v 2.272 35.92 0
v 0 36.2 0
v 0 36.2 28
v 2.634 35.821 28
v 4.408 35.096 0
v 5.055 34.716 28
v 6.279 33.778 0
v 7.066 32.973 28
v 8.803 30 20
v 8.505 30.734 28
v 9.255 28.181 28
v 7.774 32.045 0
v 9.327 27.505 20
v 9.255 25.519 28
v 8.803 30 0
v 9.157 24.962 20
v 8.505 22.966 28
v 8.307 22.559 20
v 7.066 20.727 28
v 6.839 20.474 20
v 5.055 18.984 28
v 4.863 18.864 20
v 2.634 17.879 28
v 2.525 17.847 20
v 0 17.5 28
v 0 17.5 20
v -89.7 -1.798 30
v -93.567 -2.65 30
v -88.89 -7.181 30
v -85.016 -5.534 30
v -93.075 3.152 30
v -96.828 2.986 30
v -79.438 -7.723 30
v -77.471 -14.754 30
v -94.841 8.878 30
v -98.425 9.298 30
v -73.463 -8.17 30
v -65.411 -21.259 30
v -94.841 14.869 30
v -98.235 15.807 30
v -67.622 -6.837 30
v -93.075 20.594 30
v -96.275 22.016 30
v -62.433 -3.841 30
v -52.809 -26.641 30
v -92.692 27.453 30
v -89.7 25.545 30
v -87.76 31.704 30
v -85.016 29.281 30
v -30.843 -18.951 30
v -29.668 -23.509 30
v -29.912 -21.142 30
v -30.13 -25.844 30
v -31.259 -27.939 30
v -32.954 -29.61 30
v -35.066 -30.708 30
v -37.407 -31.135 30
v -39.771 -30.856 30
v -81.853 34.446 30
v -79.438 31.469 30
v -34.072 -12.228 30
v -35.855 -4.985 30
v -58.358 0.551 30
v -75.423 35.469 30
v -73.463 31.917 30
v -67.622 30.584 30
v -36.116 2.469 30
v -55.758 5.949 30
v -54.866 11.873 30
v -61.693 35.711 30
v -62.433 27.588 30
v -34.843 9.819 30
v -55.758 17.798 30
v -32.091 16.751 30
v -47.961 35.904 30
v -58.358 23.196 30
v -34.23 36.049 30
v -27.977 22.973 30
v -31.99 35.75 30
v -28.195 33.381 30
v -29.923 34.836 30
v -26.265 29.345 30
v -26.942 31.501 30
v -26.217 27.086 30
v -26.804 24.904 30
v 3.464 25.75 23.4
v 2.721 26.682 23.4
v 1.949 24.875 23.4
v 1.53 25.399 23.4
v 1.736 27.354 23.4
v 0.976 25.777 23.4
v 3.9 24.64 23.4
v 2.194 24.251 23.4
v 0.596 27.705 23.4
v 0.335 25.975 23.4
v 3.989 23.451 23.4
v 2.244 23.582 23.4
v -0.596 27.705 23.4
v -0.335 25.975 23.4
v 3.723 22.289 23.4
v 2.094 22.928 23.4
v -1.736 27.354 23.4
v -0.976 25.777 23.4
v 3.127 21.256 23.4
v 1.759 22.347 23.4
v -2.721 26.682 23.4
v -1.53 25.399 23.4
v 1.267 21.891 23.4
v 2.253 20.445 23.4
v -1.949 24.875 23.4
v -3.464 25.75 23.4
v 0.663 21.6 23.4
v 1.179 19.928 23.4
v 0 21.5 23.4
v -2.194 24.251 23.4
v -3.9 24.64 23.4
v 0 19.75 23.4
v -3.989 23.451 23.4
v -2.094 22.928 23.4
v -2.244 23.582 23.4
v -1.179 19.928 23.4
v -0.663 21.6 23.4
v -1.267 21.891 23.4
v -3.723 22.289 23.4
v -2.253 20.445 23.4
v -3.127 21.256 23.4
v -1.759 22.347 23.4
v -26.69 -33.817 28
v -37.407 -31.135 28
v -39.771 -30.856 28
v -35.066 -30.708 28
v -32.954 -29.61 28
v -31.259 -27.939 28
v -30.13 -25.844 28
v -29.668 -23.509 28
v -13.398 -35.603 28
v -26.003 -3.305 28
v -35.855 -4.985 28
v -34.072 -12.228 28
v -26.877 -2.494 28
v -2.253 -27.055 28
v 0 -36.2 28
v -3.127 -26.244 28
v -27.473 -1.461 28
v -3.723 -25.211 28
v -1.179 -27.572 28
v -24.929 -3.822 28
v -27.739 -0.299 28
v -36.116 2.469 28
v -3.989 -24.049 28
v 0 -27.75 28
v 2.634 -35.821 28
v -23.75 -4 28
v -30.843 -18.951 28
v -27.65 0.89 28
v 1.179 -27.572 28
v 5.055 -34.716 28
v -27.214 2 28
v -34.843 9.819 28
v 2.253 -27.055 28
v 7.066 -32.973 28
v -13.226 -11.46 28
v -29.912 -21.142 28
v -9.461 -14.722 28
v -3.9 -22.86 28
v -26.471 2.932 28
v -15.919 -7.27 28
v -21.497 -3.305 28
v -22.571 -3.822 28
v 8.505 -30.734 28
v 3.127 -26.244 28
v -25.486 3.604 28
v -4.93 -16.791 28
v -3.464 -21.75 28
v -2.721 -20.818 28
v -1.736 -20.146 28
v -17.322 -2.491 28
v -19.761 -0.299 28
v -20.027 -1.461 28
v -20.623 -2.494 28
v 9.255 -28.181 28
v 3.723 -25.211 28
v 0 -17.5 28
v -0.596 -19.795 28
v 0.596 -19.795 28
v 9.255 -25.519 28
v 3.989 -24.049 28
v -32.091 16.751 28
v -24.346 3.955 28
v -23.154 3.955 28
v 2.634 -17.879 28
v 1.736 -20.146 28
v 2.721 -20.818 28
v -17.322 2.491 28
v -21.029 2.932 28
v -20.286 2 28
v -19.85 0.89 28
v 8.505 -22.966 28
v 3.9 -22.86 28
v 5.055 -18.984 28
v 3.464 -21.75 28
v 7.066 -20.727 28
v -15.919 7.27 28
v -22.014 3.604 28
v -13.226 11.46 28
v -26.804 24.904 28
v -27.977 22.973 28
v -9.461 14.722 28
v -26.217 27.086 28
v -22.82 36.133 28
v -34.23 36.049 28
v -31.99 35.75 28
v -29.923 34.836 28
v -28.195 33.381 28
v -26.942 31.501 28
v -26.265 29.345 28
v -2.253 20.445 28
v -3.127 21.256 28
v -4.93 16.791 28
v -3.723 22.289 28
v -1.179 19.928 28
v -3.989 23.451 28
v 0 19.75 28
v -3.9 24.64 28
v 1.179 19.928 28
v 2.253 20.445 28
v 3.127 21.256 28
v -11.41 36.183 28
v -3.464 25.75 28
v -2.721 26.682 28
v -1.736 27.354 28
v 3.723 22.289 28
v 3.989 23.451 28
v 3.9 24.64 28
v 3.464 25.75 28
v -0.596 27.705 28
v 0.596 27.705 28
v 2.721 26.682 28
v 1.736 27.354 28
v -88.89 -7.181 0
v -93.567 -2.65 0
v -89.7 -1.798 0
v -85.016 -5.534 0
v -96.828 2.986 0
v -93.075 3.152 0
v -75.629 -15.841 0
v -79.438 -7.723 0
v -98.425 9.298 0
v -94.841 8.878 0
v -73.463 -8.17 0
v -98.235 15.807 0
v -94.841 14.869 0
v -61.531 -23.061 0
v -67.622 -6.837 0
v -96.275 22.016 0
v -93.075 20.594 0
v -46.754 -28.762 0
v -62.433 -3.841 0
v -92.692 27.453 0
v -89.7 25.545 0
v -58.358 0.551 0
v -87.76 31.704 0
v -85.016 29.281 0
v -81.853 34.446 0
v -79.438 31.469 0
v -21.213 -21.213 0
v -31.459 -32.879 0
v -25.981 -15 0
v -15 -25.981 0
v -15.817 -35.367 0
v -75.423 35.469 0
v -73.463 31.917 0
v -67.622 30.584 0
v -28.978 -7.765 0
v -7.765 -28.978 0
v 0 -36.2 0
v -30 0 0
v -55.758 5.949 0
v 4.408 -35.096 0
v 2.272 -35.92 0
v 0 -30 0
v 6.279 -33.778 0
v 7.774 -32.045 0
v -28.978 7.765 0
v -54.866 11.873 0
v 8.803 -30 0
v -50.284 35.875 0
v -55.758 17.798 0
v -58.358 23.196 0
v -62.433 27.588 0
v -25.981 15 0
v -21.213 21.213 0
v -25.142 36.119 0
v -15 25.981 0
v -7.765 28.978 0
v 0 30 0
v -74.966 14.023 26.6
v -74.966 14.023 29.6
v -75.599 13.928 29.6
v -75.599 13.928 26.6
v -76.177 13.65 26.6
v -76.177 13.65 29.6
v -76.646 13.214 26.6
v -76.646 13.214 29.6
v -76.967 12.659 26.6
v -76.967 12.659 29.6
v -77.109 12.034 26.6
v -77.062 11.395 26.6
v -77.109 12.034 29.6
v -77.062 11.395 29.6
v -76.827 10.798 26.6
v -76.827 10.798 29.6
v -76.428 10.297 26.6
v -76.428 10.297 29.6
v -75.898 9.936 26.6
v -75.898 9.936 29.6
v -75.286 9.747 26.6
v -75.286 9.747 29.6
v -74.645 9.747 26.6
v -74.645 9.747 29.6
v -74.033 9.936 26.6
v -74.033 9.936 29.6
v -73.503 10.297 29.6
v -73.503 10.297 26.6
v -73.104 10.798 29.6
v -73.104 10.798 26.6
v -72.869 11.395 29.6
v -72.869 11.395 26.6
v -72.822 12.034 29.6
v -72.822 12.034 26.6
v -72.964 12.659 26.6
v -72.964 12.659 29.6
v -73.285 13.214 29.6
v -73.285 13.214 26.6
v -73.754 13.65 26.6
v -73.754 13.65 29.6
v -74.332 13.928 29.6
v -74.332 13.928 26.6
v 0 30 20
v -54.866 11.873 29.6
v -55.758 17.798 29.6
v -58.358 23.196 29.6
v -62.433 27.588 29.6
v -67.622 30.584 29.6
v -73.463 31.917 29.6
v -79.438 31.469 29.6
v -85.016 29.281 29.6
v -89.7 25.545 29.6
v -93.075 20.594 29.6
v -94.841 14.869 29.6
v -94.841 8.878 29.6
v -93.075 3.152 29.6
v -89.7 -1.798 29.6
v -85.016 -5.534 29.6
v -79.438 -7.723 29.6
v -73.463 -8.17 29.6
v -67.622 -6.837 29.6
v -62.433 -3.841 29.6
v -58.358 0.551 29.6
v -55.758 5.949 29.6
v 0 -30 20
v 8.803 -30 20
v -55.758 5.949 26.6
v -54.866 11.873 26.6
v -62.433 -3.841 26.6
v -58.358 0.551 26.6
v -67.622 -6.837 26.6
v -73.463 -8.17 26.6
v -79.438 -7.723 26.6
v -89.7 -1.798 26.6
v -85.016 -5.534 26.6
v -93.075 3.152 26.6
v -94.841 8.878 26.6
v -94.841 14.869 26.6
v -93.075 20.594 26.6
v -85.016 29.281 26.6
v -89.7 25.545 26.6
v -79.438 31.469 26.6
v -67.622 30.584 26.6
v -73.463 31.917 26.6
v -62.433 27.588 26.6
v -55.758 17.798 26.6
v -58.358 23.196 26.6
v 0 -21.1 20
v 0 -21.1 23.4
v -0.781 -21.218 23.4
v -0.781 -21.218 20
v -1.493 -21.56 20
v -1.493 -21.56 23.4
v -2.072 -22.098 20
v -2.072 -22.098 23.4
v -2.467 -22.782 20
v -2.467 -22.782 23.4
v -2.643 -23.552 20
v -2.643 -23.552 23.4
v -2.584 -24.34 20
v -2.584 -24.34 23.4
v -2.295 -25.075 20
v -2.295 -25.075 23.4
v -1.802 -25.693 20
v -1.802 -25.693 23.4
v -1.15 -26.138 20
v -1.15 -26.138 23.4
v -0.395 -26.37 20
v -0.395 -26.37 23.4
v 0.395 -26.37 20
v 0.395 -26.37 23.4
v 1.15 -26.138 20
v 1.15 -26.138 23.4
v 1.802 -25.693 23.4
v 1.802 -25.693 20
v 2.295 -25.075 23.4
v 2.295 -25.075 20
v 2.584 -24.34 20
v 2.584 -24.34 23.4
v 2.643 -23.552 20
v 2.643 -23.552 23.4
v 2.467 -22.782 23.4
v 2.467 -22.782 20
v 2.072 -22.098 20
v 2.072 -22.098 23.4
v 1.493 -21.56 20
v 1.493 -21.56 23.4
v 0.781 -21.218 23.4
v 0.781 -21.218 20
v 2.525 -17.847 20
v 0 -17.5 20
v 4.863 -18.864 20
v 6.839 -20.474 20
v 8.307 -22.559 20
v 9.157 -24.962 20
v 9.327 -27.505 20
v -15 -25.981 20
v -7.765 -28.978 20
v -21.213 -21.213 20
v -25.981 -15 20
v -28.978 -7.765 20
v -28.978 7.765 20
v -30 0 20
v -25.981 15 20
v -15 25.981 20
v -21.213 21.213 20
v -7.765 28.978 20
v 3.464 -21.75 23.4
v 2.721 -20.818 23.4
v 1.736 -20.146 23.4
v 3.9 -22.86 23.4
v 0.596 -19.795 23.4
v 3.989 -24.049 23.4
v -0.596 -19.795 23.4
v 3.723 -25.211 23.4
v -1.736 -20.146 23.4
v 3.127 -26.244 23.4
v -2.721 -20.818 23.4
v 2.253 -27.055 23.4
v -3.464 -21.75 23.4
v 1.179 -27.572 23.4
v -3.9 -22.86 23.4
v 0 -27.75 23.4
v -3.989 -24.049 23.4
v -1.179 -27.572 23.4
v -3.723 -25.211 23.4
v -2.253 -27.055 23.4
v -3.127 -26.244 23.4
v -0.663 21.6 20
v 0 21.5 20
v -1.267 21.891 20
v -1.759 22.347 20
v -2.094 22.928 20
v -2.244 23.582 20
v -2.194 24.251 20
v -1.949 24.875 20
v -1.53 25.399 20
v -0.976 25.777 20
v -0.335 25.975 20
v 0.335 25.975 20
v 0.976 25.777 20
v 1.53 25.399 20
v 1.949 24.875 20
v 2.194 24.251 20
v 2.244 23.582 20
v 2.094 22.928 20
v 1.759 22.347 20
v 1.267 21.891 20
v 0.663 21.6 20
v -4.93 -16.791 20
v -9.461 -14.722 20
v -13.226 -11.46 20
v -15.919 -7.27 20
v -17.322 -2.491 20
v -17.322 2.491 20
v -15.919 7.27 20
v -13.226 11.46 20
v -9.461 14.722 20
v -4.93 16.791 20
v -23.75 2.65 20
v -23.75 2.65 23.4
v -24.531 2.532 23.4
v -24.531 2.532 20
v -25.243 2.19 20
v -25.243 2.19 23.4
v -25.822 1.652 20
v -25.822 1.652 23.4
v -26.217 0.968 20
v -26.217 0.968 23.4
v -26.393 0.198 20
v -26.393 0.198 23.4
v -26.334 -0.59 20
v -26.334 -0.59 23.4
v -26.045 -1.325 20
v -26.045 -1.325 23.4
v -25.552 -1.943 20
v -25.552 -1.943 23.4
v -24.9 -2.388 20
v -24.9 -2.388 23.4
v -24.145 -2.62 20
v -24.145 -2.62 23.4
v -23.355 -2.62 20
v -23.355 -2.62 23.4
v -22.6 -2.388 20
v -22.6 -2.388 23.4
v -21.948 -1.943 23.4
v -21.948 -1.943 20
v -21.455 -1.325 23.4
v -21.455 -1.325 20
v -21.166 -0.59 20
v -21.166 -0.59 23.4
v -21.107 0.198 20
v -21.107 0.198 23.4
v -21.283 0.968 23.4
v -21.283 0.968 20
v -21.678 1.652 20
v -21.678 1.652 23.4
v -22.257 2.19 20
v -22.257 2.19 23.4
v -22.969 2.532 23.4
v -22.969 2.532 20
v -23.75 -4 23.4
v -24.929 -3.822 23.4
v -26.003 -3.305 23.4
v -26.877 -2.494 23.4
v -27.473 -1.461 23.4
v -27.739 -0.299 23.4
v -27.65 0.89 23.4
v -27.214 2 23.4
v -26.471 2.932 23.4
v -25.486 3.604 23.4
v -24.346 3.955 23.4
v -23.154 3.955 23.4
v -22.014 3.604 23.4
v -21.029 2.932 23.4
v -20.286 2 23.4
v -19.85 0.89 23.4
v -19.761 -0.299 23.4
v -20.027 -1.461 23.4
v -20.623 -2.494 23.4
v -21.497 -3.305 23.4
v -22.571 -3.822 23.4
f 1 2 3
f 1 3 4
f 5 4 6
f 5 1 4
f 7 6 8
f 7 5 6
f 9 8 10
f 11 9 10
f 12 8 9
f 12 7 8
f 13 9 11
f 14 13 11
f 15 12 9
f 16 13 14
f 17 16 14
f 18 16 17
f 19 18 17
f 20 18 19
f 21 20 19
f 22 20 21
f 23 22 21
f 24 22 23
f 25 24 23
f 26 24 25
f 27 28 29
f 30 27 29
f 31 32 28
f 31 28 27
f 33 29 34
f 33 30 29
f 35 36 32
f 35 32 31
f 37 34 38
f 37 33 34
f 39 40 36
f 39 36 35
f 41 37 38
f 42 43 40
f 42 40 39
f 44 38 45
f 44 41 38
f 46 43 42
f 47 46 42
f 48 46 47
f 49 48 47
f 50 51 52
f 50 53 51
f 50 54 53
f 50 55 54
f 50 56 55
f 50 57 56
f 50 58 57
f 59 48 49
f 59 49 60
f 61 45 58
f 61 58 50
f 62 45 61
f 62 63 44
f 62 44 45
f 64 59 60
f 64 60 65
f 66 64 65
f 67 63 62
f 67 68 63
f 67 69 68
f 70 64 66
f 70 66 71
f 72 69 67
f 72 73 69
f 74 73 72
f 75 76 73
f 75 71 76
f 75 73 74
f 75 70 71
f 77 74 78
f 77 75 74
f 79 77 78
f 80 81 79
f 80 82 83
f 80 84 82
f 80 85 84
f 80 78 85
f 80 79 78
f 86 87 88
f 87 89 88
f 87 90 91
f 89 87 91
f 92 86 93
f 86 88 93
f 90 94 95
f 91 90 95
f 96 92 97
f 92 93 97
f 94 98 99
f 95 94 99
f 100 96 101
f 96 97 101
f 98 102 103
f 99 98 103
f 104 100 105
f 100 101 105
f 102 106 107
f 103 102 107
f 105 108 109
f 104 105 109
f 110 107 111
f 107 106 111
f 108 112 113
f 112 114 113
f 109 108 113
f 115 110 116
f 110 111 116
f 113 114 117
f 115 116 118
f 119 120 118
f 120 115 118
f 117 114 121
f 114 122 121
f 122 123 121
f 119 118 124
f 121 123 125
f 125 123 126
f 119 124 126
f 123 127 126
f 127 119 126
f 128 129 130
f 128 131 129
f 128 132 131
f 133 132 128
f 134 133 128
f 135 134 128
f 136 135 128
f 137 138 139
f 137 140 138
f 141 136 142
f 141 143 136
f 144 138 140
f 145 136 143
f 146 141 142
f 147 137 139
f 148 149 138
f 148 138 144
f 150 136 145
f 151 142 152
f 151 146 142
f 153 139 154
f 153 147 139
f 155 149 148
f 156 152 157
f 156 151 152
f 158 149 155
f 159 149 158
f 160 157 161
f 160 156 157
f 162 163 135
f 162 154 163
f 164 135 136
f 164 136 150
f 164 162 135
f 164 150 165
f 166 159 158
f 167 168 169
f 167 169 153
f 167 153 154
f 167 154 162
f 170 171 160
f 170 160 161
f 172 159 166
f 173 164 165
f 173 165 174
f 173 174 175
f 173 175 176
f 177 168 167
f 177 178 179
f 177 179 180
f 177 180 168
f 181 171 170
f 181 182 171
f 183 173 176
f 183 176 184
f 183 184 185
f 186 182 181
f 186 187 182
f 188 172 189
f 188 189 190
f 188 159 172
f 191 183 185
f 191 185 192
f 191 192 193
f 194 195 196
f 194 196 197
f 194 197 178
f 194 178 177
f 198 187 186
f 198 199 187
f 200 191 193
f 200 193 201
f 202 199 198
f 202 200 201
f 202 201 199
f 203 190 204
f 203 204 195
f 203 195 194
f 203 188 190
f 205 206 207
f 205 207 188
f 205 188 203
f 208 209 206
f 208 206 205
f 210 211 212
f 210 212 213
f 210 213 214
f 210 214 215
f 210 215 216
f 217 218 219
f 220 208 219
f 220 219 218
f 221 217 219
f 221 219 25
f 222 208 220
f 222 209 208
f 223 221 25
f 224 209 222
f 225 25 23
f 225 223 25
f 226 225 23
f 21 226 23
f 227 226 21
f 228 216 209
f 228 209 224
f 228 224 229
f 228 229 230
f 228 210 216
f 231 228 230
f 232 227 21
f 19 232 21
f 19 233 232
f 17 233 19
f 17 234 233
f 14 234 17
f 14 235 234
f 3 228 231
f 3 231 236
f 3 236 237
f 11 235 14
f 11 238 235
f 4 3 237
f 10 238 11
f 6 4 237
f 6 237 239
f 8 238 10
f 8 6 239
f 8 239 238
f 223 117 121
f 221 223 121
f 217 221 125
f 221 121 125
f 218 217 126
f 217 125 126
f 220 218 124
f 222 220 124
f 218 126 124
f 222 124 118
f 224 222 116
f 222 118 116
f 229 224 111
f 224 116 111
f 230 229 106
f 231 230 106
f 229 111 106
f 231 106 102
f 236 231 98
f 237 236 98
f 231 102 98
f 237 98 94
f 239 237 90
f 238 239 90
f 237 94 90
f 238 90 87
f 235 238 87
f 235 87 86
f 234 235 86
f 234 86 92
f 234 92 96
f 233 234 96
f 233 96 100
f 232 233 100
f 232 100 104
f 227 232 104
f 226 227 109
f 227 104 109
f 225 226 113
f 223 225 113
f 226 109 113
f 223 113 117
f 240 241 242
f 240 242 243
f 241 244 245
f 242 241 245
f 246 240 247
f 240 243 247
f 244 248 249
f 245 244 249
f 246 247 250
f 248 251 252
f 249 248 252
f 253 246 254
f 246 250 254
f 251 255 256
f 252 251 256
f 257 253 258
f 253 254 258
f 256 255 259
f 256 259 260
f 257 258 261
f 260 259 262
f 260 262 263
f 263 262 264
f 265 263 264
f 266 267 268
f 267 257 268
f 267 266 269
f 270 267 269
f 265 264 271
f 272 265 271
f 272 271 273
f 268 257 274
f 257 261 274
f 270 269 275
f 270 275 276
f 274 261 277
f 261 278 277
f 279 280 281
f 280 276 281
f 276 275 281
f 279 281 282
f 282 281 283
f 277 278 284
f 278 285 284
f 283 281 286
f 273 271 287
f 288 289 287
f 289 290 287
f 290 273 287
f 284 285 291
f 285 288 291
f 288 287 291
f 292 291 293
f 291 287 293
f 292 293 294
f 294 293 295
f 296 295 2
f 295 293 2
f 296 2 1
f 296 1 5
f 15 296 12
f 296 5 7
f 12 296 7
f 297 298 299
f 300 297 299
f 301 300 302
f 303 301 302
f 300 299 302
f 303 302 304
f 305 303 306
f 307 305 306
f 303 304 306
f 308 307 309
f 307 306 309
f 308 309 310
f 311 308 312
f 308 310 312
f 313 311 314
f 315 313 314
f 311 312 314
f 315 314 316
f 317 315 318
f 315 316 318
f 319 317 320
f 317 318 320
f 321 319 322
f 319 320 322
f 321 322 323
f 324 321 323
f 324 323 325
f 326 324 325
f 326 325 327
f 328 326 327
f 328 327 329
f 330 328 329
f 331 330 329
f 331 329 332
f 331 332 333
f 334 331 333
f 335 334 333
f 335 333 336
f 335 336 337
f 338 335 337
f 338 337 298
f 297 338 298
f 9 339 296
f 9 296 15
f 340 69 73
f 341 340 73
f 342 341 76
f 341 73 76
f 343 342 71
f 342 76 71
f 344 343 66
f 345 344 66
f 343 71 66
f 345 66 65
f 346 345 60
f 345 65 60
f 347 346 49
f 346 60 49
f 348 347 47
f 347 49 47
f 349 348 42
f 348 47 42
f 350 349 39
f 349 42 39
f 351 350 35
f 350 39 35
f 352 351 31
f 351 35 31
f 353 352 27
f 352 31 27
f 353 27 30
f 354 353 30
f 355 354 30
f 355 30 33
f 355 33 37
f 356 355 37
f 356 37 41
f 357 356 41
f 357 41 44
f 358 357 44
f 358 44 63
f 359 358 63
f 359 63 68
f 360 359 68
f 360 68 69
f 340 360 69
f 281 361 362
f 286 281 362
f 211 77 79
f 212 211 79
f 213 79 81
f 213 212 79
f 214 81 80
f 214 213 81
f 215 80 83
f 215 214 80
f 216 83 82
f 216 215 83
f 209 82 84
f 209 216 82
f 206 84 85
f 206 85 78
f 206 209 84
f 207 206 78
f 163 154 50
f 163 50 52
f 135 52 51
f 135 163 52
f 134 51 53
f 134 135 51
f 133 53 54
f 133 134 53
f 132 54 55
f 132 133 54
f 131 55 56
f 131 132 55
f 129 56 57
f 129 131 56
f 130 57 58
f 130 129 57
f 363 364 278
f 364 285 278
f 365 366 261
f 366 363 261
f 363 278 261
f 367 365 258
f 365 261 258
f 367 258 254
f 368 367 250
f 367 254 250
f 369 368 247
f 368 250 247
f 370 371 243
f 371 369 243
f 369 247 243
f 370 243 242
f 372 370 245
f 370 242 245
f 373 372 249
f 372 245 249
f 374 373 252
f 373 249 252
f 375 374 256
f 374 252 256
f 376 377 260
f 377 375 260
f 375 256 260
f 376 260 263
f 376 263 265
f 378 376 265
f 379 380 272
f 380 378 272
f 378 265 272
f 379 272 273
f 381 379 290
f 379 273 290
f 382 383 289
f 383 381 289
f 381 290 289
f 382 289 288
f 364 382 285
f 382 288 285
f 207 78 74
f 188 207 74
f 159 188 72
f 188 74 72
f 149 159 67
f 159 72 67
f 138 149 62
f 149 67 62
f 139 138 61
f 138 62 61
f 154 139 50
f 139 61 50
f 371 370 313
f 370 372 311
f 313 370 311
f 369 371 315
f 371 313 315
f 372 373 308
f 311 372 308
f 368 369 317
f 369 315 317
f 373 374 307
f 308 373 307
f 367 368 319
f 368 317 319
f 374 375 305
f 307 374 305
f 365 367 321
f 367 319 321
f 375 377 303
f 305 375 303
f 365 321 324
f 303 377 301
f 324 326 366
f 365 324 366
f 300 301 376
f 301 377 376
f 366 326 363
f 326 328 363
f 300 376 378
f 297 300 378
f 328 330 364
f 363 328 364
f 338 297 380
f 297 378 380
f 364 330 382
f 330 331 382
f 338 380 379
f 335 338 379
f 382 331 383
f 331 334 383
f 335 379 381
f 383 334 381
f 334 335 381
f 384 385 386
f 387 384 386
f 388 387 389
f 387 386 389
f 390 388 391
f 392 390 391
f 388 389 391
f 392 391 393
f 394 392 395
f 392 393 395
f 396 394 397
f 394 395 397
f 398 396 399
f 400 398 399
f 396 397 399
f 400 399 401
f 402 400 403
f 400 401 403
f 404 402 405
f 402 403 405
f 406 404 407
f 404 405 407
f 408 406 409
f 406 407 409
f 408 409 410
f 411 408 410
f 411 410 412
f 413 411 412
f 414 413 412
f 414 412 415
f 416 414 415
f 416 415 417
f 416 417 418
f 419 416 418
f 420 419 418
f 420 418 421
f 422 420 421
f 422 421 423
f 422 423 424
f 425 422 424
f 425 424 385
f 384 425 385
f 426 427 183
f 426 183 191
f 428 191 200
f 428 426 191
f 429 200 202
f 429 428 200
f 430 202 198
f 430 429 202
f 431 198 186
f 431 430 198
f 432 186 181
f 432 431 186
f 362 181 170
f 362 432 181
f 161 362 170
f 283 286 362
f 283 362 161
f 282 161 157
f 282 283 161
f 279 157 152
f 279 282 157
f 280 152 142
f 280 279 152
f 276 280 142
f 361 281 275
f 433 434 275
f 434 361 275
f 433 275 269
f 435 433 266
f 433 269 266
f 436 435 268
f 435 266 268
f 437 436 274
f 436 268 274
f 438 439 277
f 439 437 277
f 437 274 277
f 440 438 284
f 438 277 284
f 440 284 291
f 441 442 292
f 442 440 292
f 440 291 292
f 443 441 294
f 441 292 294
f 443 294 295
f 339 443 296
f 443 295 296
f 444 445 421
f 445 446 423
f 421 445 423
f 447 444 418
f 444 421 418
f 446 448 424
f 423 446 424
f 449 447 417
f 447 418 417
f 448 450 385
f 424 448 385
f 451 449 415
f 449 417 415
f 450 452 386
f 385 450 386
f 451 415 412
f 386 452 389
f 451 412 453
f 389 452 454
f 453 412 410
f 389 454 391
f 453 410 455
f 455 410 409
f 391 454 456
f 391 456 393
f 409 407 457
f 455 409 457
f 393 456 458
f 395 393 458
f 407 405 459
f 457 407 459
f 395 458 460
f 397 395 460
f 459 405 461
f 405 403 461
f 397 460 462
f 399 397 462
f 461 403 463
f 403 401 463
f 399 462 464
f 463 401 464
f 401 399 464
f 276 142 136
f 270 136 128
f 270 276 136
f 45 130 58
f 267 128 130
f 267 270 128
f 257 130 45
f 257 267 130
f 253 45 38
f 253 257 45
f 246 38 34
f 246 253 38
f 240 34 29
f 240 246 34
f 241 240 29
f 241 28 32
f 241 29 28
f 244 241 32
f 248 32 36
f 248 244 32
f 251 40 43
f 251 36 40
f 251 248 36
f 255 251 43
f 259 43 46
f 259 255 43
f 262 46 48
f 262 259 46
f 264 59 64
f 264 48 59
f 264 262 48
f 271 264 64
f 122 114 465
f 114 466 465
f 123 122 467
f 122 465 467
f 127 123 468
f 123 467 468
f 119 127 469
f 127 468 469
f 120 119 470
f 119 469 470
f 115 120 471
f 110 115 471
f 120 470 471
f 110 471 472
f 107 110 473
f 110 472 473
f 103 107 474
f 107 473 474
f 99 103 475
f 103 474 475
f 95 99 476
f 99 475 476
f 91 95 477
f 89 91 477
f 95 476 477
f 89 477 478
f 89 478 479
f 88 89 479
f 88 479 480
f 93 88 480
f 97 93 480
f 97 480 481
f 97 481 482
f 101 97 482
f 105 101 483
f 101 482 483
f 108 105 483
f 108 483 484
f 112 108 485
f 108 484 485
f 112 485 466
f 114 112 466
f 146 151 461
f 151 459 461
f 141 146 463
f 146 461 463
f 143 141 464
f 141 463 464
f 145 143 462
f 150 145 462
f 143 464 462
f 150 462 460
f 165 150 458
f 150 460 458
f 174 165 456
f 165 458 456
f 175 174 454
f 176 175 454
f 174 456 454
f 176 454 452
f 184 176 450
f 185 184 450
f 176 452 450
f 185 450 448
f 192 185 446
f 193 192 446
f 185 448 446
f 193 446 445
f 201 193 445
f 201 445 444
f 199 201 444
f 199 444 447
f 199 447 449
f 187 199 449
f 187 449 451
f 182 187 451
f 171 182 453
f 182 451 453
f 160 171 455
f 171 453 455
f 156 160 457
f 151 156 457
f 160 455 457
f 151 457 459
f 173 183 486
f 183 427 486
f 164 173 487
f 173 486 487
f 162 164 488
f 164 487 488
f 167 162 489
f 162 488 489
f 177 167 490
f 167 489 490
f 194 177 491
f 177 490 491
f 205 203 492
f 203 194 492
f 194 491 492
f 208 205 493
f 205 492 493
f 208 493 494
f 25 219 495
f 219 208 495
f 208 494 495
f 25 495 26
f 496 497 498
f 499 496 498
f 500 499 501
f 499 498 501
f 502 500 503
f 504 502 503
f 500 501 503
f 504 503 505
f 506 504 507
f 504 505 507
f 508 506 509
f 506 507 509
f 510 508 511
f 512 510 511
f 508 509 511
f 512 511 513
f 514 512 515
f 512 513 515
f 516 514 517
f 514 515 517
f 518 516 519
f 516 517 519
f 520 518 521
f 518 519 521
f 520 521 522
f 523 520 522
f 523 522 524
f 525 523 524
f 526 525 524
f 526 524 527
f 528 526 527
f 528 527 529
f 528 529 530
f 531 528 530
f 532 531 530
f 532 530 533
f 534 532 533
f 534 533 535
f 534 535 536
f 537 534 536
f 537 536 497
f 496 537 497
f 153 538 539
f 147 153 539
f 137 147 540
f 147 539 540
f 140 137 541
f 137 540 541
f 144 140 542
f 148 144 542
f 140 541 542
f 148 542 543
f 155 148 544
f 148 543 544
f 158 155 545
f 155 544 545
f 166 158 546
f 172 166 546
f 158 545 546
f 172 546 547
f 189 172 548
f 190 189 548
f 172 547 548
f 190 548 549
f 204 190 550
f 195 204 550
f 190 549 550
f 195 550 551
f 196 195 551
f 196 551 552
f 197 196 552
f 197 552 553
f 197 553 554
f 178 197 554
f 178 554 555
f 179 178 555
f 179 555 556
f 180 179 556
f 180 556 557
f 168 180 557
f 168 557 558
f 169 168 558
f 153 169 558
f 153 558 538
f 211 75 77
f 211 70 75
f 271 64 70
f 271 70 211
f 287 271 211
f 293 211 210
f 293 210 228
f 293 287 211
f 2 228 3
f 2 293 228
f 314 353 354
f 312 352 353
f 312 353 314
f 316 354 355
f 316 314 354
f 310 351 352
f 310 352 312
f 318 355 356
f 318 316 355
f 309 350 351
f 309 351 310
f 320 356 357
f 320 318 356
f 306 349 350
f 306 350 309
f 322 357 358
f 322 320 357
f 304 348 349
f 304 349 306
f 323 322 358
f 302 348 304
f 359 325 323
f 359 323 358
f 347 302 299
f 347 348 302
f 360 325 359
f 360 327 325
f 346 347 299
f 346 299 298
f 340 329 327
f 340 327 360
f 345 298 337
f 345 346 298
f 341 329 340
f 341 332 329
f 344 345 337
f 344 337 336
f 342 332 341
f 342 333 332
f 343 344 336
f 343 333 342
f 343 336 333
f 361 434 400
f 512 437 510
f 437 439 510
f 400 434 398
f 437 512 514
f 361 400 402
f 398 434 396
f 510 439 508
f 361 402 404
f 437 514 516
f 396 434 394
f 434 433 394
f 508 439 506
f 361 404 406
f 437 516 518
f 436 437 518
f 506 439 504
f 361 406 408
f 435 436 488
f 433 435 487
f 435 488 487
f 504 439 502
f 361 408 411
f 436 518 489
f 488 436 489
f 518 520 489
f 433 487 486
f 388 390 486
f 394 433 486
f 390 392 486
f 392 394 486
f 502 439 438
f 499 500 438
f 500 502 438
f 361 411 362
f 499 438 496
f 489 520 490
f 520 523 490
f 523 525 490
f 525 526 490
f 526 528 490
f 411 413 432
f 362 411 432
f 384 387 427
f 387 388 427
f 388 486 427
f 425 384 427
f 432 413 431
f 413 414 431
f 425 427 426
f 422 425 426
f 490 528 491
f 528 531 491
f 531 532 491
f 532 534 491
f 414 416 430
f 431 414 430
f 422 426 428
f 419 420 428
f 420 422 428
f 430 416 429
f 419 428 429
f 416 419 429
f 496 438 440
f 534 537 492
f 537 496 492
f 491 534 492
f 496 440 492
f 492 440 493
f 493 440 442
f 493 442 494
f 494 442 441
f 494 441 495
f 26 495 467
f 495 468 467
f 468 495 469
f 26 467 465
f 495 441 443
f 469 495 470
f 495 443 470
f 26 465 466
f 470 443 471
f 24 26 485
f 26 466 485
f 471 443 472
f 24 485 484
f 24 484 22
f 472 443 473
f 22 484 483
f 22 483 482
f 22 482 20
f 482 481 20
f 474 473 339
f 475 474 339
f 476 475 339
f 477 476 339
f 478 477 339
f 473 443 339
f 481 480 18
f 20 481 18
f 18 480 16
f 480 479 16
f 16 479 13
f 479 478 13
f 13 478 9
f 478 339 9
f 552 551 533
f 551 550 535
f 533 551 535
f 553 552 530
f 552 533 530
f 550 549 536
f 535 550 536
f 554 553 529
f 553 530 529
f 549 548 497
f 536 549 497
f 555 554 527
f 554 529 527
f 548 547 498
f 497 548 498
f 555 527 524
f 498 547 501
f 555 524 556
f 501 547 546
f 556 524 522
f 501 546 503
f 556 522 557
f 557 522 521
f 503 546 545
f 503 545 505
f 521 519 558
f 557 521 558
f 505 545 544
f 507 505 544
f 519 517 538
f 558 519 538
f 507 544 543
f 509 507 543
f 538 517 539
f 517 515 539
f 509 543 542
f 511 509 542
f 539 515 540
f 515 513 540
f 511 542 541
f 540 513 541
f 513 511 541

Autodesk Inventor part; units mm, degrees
ref_plane "YZ Plane" through (0, 0, 0) normal (1, 0, 0) x (0, 1, 0)
ref_plane "XZ Plane" through (0, 0, 0) normal (0, 1, 0) x (-1, 0, 0)
ref_plane "XY Plane" through (0, 0, 0) normal (0, 0, 1) x (1, 0, 0)
sketch "Sketch1" plane through (0, 0, 0) normal (0, 0, 1) x (1, 0, 0)
  arc A0 (0, 30) -> (0, -30) centre (0, 0) ccw
  arc A1 (0, 17.5) -> (0, -17.5) centre (0, 0) ccw
  line L0 (0, 36.2) -> (0, -36.2) construction
  line L1 (0, 17.5) -> (0, 36.2) construction
  line L2 (0, -17.5) -> (0, -36.2) construction
  circle A2 centre (-74.9655, 11.8734) radius 20.1
  circle A3 centre (0, 0) radius 75.9 construction
  arc A4 (0, 23.75) -> (0, -23.75) centre (0, 0) ccw construction
  line L3 (0, -23.75) -> (0, 23.75) construction
  line L4 (0, 23.75) -> (0, 0) construction
  arc A5 (0, 17.5) -> (0, 36.2) centre (0, 26.85) ccw
  arc A6 (0, -36.2) -> (0, -17.5) centre (0, -26.85) ccw
  arc A7 (-75.423, 35.4689) -> (-88.8905, -7.1807) centre (-74.9655, 11.8734) ccw
  line L5 (0, 30) -> (8.8034, 30)
  line L6 (0, -30) -> (8.8034, -30)
  arc A8 (0, 36.2) -> (0, -36.2) centre (0, 0) ccw
  circle A9 centre (-74.9655, 11.8734) radius 23.6 construction
  arc A10 (0, 36.2) -> (-75.423, 35.4689) centre (0, -3854.8474) ccw
  arc A11 (-88.8905, -7.1807) -> (0, -36.2) centre (0, 114.4519) ccw
  line L7 (0, 0) -> (-75.9, 0) construction
  line L8 (-74.9655, 11.8734) -> (0, 0) construction
  line L9 (0, 0) -> (-75.0466, 11.3497) construction
  point P0 (-23.75, 0)
  dimension "d0" = 60
  dimension "d1" = 35
  dimension "d2" = 75.9
  dimension "d5" = 40.2
  dimension "FixHole_Rad" = 23.75
  dimension "d25" = 72.4
  dimension "d52" = 3.5
  dimension "d63" = 0
  dimension "d72" = 9
  dimension "d73" = 8.6
extrude "Extrusion1" add sketch "Sketch1" along normal blind 30 contours L5 A5 A1 A6 L6 A0 | A0 L6 A6 A8 A5 L5 | A8 A11 A7 A10 | A2
extrude "Extrusion3" cut sketch "Sketch1" along normal blind 20 contours L5 A5 A1 A6 L6 A0
extrude "Extrusion5" cut sketch "Sketch1" along normal blind 26.6 contours A2
extrude "Extrusion6" cut sketch "Sketch1" against normal blind 0.4 from surface at 30 contours A2
extrude "Extrusion8" cut sketch "Sketch1" against normal blind 2 from surface at 30 contours L5 A5 A1 A6 L6 A0 | A0 L6 A6 A8 A5 L5
sketch "Sketch2" plane through (0, 0, 28) normal (0, 0, 1) x (1, 0, 0)
  point P0 (0, 0)
  point P1 (0, -23.75)
  point P2 (-23.75, 0)
  point P3 (0, 23.75)
hole "Hole2" at (0, -23.75, 28) at (-23.75, 0, 28) at (0, 23.75, 28) direction (0, 0, -1) diameter 4.5 end through all counterbore diameter 8 counterbore depth 4.6 clearance for "Socket Head Cap Screw ISO 4762" size "M4" standard "ISO"
fillet "Fillet1" radius 8 3 edges at (-88.8905, -7.1807, 15) (0, 36.2, 29) (0, -36.2, 29)
hole "Hole3" at (0, -23.75, 0) at (-23.75, 0, 0) direction (0, 0, 1) diameter 5.3 end through all clearance for "Countersunk Flat Head Screw DIN EN ISO 2009" size "M5" standard "DIN"
hole "Hole4" at (-74.9655, 11.8734, 0) direction (0, 0, 1) diameter 4.3 end through all clearance for "Countersunk Flat Head Screw DIN EN ISO 2009" size "M4" standard "DIN"
equation "\"d0\" = SJ_D_out"
equation "\"d12\" = d11"
equation "\"d13\" = d12"
equation "\"StabelizerExtrusion\" = 8"
equation "\"SJ_D_out\" = 60"
equation "\"d11\" = 3.8"
properties part number "CounterWeightFixation_oldVersion" material "PAEK Plastic"
